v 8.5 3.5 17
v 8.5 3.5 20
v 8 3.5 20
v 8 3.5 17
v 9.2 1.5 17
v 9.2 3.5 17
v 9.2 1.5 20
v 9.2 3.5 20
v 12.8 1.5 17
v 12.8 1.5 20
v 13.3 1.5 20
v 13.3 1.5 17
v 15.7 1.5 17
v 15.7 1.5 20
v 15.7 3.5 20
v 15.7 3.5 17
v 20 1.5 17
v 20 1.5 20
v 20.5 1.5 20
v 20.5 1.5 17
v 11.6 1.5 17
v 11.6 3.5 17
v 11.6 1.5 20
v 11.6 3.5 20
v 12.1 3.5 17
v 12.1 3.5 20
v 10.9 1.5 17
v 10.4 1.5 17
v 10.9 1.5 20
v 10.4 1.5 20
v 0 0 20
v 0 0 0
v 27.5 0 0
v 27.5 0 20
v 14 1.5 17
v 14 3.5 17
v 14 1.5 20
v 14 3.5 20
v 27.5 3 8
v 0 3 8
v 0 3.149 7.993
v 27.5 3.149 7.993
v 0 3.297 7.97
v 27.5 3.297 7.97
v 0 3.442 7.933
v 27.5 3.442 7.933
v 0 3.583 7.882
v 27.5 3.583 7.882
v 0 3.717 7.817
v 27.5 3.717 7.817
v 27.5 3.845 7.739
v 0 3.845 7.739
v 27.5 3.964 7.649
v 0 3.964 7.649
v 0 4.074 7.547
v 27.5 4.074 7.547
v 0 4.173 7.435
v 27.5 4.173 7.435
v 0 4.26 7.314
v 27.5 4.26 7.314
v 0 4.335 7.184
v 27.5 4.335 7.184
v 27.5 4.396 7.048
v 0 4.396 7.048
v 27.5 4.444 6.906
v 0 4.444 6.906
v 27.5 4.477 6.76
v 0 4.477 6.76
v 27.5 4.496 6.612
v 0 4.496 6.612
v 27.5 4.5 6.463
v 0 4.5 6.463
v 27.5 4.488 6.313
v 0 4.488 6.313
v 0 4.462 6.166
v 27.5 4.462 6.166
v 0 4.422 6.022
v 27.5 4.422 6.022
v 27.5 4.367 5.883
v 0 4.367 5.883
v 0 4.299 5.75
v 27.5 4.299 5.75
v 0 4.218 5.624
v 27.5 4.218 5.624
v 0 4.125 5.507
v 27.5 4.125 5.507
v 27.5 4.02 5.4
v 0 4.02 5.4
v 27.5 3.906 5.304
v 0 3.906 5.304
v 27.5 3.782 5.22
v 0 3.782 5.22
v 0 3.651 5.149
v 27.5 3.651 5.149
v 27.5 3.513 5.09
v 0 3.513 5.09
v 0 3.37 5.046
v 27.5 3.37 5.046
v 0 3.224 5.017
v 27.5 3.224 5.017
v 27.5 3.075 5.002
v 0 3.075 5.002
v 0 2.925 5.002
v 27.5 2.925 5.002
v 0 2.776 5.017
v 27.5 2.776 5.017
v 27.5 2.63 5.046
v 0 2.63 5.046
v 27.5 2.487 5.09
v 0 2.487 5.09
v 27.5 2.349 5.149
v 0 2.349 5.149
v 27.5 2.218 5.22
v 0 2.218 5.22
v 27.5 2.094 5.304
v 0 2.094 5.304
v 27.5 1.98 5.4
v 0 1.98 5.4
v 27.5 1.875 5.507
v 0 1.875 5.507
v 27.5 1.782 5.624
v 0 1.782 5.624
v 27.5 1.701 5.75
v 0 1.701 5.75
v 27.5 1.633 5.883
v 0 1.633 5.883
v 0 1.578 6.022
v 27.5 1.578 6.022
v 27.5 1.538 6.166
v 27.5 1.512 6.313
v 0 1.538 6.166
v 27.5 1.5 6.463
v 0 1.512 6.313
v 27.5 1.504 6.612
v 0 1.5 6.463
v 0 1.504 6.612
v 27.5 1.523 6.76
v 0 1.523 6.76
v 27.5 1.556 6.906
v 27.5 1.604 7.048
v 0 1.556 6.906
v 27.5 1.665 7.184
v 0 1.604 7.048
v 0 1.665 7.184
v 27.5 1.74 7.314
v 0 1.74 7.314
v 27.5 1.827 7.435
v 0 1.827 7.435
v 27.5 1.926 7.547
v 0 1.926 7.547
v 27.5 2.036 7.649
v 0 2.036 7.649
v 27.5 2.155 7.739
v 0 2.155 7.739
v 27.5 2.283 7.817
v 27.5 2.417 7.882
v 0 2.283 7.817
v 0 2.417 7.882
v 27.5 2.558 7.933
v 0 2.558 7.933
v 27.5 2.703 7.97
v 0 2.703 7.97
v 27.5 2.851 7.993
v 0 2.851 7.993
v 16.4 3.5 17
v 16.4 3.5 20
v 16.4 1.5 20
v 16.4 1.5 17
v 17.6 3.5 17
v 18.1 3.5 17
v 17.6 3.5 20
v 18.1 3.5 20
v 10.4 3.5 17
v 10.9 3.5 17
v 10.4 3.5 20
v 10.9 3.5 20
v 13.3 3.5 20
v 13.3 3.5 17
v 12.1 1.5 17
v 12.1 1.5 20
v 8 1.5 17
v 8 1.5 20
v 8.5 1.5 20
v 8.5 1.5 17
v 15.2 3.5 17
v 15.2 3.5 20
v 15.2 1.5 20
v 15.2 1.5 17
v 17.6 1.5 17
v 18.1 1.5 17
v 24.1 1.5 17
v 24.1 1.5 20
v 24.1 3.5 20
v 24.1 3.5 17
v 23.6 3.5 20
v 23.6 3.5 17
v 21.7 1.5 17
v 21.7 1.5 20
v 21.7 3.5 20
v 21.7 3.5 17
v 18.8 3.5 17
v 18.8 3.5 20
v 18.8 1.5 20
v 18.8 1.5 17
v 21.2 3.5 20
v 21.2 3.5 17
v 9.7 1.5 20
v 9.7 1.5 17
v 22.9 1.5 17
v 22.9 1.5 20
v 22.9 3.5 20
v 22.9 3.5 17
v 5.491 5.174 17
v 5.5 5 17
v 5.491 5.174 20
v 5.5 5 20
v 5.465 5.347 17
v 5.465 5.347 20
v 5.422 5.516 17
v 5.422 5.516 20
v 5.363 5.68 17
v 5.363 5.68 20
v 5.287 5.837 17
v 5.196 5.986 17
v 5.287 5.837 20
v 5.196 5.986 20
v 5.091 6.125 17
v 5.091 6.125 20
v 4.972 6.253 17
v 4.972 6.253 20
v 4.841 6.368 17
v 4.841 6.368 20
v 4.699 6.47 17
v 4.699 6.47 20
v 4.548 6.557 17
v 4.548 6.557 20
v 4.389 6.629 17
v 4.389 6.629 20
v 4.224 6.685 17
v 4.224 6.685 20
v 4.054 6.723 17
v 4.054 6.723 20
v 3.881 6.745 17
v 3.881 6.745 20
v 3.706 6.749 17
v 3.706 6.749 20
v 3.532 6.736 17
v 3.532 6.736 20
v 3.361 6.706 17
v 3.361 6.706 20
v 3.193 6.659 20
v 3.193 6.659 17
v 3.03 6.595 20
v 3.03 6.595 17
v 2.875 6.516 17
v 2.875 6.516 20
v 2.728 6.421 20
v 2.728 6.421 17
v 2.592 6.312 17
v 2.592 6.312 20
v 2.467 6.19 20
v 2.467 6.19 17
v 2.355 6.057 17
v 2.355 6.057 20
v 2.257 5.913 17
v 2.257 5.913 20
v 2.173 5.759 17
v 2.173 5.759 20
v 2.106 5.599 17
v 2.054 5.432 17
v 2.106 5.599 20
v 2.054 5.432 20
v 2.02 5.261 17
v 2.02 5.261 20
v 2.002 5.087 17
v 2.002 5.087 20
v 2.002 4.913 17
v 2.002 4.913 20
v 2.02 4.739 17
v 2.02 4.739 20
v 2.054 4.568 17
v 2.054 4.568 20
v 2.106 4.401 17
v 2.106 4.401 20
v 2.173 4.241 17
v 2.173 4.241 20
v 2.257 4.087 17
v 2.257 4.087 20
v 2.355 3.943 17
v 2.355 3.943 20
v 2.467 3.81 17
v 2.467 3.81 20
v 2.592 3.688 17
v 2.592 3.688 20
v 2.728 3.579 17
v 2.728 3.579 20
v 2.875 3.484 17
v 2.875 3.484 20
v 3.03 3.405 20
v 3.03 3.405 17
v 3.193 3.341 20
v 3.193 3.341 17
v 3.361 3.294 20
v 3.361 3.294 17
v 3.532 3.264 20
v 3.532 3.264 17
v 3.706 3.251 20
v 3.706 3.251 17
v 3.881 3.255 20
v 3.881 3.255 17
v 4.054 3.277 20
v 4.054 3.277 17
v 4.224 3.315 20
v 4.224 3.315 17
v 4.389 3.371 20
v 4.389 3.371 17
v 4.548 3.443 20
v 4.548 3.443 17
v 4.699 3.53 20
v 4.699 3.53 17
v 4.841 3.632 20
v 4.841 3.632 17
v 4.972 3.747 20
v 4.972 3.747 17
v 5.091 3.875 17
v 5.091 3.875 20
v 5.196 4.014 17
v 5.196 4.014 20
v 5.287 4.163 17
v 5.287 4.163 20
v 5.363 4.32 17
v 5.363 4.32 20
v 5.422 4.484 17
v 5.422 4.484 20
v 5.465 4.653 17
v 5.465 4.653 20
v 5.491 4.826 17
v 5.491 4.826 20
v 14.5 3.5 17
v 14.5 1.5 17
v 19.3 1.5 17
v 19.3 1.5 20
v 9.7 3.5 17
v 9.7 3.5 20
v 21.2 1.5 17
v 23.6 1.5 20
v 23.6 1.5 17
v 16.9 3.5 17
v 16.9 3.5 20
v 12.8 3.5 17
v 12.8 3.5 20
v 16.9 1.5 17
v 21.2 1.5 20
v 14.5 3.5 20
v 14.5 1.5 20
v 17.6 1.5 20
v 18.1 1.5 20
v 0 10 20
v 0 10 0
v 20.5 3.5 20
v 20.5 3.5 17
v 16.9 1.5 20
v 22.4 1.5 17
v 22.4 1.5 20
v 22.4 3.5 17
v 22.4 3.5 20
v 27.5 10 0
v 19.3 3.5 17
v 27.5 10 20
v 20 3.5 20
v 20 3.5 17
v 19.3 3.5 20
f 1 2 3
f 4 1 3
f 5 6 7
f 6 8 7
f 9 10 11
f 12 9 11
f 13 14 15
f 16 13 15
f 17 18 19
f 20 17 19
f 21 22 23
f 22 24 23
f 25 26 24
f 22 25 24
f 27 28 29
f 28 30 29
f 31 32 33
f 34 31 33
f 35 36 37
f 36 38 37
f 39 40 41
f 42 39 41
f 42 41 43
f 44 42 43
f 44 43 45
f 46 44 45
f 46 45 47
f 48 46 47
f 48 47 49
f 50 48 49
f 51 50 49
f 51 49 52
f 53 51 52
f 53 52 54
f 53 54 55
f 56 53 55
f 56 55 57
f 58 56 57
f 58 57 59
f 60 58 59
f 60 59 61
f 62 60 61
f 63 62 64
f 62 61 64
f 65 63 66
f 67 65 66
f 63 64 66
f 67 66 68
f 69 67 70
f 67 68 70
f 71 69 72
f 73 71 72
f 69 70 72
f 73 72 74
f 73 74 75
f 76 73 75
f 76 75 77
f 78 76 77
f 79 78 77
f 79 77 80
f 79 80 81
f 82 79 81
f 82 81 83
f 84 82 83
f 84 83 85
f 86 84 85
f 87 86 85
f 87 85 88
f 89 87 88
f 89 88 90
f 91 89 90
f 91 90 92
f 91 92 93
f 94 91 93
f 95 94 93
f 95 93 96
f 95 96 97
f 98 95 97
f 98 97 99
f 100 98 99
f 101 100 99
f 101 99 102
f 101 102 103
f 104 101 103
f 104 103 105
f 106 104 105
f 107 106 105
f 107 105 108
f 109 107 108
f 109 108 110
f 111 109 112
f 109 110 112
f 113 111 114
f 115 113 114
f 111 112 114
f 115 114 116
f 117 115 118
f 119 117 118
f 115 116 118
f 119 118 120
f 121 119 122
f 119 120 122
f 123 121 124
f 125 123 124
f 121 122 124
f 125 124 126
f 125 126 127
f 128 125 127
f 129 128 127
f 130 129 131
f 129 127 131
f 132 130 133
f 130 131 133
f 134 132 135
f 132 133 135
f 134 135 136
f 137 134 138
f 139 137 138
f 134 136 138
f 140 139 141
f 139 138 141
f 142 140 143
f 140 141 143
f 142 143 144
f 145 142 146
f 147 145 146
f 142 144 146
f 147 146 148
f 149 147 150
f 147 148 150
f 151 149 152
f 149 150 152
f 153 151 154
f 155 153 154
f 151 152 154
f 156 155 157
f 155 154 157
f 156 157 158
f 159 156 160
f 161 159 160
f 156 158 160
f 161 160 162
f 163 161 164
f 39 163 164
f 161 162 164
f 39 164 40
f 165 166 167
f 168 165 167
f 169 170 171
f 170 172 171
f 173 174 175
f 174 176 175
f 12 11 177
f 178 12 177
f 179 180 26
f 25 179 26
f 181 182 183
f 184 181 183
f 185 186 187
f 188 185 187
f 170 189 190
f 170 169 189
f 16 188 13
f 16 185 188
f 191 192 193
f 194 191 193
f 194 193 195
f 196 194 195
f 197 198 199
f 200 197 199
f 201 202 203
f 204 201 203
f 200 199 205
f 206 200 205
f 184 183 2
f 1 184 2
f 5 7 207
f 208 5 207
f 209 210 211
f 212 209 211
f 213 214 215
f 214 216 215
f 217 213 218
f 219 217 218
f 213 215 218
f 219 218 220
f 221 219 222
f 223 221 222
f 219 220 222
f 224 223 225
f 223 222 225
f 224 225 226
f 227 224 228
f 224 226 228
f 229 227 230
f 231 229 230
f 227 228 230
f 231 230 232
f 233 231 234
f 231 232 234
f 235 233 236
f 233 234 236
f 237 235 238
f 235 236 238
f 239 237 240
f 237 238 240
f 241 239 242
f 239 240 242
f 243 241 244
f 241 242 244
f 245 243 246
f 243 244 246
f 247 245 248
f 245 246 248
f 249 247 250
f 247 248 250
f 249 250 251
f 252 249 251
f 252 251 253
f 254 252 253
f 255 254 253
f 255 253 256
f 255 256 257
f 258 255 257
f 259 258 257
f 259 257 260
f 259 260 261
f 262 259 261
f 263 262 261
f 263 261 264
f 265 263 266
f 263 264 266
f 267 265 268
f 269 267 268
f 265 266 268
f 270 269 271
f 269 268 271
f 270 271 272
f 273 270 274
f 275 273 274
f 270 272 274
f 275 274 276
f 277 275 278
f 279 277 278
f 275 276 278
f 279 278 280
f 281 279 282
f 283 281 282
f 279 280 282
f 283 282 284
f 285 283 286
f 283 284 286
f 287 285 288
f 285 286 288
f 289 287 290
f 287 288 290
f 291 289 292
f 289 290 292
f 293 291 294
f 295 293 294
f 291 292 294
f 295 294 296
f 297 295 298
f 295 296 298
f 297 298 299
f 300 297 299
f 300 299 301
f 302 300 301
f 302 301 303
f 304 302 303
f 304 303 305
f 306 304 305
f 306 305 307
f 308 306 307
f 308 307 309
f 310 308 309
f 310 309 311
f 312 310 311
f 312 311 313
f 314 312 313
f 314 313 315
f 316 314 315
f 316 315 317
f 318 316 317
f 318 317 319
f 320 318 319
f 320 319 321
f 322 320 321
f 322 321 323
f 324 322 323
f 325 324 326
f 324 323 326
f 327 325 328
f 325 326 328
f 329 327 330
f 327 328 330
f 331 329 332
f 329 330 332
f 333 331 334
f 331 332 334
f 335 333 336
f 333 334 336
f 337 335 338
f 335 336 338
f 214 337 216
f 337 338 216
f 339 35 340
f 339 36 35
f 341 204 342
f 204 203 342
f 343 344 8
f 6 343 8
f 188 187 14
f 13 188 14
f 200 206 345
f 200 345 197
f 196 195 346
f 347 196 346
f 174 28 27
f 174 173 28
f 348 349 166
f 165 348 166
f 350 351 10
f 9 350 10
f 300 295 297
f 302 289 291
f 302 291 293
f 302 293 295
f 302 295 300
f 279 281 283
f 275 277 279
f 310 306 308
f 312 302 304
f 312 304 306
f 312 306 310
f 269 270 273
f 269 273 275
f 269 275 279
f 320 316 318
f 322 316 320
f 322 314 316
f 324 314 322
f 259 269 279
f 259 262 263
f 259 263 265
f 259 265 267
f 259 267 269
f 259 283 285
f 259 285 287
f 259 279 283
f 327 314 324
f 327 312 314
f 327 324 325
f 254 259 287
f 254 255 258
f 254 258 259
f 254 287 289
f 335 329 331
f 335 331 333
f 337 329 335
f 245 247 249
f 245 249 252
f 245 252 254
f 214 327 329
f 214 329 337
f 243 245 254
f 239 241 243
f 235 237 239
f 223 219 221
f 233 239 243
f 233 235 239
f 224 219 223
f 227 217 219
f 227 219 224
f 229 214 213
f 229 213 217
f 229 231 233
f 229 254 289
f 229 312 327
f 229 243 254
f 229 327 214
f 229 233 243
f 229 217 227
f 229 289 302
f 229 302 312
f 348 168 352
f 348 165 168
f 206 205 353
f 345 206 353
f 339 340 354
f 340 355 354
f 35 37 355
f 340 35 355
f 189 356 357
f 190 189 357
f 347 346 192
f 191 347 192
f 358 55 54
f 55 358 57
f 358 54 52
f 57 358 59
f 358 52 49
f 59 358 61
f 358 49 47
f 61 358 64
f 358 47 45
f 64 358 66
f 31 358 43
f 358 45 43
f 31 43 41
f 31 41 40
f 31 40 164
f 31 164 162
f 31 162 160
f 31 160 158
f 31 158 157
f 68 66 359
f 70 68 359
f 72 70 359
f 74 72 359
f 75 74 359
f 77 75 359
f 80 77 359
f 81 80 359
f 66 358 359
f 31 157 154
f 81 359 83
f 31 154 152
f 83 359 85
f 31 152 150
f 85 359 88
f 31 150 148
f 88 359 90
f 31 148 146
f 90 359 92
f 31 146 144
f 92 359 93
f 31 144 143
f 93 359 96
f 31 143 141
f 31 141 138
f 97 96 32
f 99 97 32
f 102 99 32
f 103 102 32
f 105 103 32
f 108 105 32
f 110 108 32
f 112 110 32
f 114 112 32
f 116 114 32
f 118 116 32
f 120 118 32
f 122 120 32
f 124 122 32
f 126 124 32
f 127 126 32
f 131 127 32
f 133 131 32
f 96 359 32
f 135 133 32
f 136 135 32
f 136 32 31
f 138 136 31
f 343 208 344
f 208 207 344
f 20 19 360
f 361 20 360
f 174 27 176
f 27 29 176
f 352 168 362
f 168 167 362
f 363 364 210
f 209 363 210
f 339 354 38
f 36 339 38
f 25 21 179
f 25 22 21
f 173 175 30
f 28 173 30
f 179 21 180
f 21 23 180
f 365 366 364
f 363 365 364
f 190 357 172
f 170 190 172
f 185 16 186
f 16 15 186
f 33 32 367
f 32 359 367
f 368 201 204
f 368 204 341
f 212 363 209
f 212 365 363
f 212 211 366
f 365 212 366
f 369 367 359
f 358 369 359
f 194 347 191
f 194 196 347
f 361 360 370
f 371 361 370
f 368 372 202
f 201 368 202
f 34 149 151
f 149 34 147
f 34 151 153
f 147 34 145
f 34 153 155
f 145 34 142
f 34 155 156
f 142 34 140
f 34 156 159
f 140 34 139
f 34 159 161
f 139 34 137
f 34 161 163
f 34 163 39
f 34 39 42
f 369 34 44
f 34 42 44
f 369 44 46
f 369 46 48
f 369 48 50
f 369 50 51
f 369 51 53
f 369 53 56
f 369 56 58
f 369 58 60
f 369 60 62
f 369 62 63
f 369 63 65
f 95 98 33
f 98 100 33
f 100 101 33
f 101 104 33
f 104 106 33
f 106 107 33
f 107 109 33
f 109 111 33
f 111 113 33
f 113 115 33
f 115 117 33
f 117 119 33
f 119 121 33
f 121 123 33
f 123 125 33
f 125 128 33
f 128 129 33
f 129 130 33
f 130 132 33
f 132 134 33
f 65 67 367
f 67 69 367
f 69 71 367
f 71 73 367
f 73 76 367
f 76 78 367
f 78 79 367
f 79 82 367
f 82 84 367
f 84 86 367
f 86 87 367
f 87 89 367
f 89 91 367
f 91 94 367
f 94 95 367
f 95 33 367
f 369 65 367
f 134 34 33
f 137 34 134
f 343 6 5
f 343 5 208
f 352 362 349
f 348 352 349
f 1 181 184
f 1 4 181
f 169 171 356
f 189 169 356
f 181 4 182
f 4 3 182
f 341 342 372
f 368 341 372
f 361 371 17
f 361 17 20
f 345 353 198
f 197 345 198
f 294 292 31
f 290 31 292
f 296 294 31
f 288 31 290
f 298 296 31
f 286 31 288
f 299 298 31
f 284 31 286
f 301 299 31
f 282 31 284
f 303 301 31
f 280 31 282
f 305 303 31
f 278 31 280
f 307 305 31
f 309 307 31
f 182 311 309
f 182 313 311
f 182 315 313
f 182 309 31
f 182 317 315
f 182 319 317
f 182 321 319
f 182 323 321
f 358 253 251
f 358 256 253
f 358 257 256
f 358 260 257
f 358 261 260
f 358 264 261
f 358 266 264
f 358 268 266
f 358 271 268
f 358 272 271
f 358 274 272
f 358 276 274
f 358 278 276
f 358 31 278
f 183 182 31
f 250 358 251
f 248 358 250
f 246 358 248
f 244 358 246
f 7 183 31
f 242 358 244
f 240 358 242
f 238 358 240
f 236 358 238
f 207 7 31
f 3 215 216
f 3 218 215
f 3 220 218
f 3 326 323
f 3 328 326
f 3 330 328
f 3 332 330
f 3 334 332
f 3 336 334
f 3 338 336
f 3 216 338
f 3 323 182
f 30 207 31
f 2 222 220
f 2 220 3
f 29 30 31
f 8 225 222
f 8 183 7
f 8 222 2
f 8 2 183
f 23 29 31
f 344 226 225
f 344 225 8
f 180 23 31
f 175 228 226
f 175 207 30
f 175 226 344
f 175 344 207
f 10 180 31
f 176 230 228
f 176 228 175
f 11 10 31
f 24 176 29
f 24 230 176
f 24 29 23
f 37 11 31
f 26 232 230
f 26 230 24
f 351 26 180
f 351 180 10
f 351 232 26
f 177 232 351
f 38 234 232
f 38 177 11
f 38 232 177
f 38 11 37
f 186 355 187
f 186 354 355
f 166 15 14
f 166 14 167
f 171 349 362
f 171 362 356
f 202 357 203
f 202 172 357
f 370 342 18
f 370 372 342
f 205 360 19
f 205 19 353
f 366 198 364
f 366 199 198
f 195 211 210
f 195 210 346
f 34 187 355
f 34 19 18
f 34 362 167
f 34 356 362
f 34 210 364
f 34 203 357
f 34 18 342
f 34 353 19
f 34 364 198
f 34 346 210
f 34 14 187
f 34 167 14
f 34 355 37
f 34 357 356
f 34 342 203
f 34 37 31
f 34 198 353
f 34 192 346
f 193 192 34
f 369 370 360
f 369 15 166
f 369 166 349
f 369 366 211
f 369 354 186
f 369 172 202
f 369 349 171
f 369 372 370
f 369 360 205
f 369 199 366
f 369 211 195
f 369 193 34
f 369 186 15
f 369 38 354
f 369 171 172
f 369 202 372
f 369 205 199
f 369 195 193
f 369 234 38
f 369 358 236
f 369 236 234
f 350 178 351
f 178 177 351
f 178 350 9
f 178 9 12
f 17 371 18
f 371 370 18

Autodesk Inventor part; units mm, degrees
ref_plane "YZ Plane" through (0, 0, 0) normal (1, 0, 0) x (0, 1, 0)
ref_plane "XZ Plane" through (0, 0, 0) normal (0, 1, 0) x (-1, 0, 0)
ref_plane "XY Plane" through (0, 0, 0) normal (0, 0, 1) x (1, 0, 0)
sketch "Sketch1" plane through (0, 0, 0) normal (0, 0, 1) x (1, 0, 0)
  line L0 (0, 0) -> (27.5, 0)
  line L1 (27.5, 0) -> (27.5, 10)
  line L2 (27.5, 10) -> (0, 10)
  line L3 (0, 10) -> (0, 0)
  dimension "d0" = 27.5
  dimension "d1" = 10
extrude "Extrusion1" add sketch "Sketch1" along normal blind 20
sketch "Sketch2" plane through (0, 0, 20) normal (0, 0, 1) x (1, 0, 0)
  circle A0 centre (3.75, 5) radius 1.75
  line L0 (0, 0) -> (27.5, 0) projected
  line L1 (0, 10) -> (0, 0) projected
  line L2 (24.1, 3.5) -> (23.6, 3.5)
  line L3 (23.6, 3.5) -> (23.6, 1.5)
  line L4 (23.6, 1.5) -> (24.1, 1.5)
  line L5 (24.1, 1.5) -> (24.1, 3.5)
  line L6 (27.5, 0) -> (27.5, 10) projected
  line L7 (22.9, 3.5) -> (22.4, 3.5)
  line L8 (22.4, 3.5) -> (22.4, 1.5)
  line L9 (22.4, 1.5) -> (22.9, 1.5)
  line L10 (22.9, 1.5) -> (22.9, 3.5)
  line L11 (21.7, 3.5) -> (21.2, 3.5)
  line L12 (21.2, 3.5) -> (21.2, 1.5)
  line L13 (21.2, 1.5) -> (21.7, 1.5)
  line L14 (21.7, 1.5) -> (21.7, 3.5)
  line L15 (20.5, 3.5) -> (20, 3.5)
  line L16 (20, 3.5) -> (20, 1.5)
  line L17 (20, 1.5) -> (20.5, 1.5)
  line L18 (20.5, 1.5) -> (20.5, 3.5)
  line L19 (19.3, 3.5) -> (18.8, 3.5)
  line L20 (18.8, 3.5) -> (18.8, 1.5)
  line L21 (18.8, 1.5) -> (19.3, 1.5)
  line L22 (19.3, 1.5) -> (19.3, 3.5)
  line L23 (18.1, 3.5) -> (17.6, 3.5)
  line L24 (17.6, 3.5) -> (17.6, 1.5)
  line L25 (17.6, 1.5) -> (18.1, 1.5)
  line L26 (18.1, 1.5) -> (18.1, 3.5)
  line L27 (16.9, 3.5) -> (16.4, 3.5)
  line L28 (16.4, 3.5) -> (16.4, 1.5)
  line L29 (16.4, 1.5) -> (16.9, 1.5)
  line L30 (16.9, 1.5) -> (16.9, 3.5)
  line L31 (15.7, 3.5) -> (15.2, 3.5)
  line L32 (15.2, 3.5) -> (15.2, 1.5)
  line L33 (15.2, 1.5) -> (15.7, 1.5)
  line L34 (15.7, 1.5) -> (15.7, 3.5)
  line L35 (14.5, 3.5) -> (14, 3.5)
  line L36 (14, 3.5) -> (14, 1.5)
  line L37 (14, 1.5) -> (14.5, 1.5)
  line L38 (14.5, 1.5) -> (14.5, 3.5)
  line L39 (13.3, 3.5) -> (12.8, 3.5)
  line L40 (12.8, 3.5) -> (12.8, 1.5)
  line L41 (12.8, 1.5) -> (13.3, 1.5)
  line L42 (13.3, 1.5) -> (13.3, 3.5)
  line L43 (12.1, 3.5) -> (11.6, 3.5)
  line L44 (11.6, 3.5) -> (11.6, 1.5)
  line L45 (11.6, 1.5) -> (12.1, 1.5)
  line L46 (12.1, 1.5) -> (12.1, 3.5)
  line L47 (10.9, 3.5) -> (10.4, 3.5)
  line L48 (10.4, 3.5) -> (10.4, 1.5)
  line L49 (10.4, 1.5) -> (10.9, 1.5)
  line L50 (10.9, 1.5) -> (10.9, 3.5)
  line L51 (9.7, 3.5) -> (9.2, 3.5)
  line L52 (9.2, 3.5) -> (9.2, 1.5)
  line L53 (9.2, 1.5) -> (9.7, 1.5)
  line L54 (9.7, 1.5) -> (9.7, 3.5)
  line L55 (8.5, 3.5) -> (8, 3.5)
  line L56 (8, 3.5) -> (8, 1.5)
  line L57 (8, 1.5) -> (8.5, 1.5)
  line L58 (8.5, 1.5) -> (8.5, 3.5)
  dimension "d4" = 5
  dimension "d5" = 3.75
  dimension "d6" = 3.5
  dimension "d7" = 0.5
  dimension "d8" = 2
  dimension "d9" = 3.4
  dimension "d10" = 1.5
  dimension "d13" = 1.2
extrude "Extrusion2" cut sketch "Sketch2" against normal blind 3
sketch "Sketch3" plane through (0, 0, 0) normal (-1, 0, 0) x (0, 0, 1)
  circle A0 centre (6.5, 3) radius 1.5
  line L0 (0, 10) -> (0, 0) projected
  line L1 (0, 0) -> (20, 0) projected
  dimension "d20" = 3
  dimension "d21" = 6.5
  dimension "d22" = 3
extrude "Extrusion3" cut sketch "Sketch3" against normal through all
properties part number "Head" material "ABS Plastic"
